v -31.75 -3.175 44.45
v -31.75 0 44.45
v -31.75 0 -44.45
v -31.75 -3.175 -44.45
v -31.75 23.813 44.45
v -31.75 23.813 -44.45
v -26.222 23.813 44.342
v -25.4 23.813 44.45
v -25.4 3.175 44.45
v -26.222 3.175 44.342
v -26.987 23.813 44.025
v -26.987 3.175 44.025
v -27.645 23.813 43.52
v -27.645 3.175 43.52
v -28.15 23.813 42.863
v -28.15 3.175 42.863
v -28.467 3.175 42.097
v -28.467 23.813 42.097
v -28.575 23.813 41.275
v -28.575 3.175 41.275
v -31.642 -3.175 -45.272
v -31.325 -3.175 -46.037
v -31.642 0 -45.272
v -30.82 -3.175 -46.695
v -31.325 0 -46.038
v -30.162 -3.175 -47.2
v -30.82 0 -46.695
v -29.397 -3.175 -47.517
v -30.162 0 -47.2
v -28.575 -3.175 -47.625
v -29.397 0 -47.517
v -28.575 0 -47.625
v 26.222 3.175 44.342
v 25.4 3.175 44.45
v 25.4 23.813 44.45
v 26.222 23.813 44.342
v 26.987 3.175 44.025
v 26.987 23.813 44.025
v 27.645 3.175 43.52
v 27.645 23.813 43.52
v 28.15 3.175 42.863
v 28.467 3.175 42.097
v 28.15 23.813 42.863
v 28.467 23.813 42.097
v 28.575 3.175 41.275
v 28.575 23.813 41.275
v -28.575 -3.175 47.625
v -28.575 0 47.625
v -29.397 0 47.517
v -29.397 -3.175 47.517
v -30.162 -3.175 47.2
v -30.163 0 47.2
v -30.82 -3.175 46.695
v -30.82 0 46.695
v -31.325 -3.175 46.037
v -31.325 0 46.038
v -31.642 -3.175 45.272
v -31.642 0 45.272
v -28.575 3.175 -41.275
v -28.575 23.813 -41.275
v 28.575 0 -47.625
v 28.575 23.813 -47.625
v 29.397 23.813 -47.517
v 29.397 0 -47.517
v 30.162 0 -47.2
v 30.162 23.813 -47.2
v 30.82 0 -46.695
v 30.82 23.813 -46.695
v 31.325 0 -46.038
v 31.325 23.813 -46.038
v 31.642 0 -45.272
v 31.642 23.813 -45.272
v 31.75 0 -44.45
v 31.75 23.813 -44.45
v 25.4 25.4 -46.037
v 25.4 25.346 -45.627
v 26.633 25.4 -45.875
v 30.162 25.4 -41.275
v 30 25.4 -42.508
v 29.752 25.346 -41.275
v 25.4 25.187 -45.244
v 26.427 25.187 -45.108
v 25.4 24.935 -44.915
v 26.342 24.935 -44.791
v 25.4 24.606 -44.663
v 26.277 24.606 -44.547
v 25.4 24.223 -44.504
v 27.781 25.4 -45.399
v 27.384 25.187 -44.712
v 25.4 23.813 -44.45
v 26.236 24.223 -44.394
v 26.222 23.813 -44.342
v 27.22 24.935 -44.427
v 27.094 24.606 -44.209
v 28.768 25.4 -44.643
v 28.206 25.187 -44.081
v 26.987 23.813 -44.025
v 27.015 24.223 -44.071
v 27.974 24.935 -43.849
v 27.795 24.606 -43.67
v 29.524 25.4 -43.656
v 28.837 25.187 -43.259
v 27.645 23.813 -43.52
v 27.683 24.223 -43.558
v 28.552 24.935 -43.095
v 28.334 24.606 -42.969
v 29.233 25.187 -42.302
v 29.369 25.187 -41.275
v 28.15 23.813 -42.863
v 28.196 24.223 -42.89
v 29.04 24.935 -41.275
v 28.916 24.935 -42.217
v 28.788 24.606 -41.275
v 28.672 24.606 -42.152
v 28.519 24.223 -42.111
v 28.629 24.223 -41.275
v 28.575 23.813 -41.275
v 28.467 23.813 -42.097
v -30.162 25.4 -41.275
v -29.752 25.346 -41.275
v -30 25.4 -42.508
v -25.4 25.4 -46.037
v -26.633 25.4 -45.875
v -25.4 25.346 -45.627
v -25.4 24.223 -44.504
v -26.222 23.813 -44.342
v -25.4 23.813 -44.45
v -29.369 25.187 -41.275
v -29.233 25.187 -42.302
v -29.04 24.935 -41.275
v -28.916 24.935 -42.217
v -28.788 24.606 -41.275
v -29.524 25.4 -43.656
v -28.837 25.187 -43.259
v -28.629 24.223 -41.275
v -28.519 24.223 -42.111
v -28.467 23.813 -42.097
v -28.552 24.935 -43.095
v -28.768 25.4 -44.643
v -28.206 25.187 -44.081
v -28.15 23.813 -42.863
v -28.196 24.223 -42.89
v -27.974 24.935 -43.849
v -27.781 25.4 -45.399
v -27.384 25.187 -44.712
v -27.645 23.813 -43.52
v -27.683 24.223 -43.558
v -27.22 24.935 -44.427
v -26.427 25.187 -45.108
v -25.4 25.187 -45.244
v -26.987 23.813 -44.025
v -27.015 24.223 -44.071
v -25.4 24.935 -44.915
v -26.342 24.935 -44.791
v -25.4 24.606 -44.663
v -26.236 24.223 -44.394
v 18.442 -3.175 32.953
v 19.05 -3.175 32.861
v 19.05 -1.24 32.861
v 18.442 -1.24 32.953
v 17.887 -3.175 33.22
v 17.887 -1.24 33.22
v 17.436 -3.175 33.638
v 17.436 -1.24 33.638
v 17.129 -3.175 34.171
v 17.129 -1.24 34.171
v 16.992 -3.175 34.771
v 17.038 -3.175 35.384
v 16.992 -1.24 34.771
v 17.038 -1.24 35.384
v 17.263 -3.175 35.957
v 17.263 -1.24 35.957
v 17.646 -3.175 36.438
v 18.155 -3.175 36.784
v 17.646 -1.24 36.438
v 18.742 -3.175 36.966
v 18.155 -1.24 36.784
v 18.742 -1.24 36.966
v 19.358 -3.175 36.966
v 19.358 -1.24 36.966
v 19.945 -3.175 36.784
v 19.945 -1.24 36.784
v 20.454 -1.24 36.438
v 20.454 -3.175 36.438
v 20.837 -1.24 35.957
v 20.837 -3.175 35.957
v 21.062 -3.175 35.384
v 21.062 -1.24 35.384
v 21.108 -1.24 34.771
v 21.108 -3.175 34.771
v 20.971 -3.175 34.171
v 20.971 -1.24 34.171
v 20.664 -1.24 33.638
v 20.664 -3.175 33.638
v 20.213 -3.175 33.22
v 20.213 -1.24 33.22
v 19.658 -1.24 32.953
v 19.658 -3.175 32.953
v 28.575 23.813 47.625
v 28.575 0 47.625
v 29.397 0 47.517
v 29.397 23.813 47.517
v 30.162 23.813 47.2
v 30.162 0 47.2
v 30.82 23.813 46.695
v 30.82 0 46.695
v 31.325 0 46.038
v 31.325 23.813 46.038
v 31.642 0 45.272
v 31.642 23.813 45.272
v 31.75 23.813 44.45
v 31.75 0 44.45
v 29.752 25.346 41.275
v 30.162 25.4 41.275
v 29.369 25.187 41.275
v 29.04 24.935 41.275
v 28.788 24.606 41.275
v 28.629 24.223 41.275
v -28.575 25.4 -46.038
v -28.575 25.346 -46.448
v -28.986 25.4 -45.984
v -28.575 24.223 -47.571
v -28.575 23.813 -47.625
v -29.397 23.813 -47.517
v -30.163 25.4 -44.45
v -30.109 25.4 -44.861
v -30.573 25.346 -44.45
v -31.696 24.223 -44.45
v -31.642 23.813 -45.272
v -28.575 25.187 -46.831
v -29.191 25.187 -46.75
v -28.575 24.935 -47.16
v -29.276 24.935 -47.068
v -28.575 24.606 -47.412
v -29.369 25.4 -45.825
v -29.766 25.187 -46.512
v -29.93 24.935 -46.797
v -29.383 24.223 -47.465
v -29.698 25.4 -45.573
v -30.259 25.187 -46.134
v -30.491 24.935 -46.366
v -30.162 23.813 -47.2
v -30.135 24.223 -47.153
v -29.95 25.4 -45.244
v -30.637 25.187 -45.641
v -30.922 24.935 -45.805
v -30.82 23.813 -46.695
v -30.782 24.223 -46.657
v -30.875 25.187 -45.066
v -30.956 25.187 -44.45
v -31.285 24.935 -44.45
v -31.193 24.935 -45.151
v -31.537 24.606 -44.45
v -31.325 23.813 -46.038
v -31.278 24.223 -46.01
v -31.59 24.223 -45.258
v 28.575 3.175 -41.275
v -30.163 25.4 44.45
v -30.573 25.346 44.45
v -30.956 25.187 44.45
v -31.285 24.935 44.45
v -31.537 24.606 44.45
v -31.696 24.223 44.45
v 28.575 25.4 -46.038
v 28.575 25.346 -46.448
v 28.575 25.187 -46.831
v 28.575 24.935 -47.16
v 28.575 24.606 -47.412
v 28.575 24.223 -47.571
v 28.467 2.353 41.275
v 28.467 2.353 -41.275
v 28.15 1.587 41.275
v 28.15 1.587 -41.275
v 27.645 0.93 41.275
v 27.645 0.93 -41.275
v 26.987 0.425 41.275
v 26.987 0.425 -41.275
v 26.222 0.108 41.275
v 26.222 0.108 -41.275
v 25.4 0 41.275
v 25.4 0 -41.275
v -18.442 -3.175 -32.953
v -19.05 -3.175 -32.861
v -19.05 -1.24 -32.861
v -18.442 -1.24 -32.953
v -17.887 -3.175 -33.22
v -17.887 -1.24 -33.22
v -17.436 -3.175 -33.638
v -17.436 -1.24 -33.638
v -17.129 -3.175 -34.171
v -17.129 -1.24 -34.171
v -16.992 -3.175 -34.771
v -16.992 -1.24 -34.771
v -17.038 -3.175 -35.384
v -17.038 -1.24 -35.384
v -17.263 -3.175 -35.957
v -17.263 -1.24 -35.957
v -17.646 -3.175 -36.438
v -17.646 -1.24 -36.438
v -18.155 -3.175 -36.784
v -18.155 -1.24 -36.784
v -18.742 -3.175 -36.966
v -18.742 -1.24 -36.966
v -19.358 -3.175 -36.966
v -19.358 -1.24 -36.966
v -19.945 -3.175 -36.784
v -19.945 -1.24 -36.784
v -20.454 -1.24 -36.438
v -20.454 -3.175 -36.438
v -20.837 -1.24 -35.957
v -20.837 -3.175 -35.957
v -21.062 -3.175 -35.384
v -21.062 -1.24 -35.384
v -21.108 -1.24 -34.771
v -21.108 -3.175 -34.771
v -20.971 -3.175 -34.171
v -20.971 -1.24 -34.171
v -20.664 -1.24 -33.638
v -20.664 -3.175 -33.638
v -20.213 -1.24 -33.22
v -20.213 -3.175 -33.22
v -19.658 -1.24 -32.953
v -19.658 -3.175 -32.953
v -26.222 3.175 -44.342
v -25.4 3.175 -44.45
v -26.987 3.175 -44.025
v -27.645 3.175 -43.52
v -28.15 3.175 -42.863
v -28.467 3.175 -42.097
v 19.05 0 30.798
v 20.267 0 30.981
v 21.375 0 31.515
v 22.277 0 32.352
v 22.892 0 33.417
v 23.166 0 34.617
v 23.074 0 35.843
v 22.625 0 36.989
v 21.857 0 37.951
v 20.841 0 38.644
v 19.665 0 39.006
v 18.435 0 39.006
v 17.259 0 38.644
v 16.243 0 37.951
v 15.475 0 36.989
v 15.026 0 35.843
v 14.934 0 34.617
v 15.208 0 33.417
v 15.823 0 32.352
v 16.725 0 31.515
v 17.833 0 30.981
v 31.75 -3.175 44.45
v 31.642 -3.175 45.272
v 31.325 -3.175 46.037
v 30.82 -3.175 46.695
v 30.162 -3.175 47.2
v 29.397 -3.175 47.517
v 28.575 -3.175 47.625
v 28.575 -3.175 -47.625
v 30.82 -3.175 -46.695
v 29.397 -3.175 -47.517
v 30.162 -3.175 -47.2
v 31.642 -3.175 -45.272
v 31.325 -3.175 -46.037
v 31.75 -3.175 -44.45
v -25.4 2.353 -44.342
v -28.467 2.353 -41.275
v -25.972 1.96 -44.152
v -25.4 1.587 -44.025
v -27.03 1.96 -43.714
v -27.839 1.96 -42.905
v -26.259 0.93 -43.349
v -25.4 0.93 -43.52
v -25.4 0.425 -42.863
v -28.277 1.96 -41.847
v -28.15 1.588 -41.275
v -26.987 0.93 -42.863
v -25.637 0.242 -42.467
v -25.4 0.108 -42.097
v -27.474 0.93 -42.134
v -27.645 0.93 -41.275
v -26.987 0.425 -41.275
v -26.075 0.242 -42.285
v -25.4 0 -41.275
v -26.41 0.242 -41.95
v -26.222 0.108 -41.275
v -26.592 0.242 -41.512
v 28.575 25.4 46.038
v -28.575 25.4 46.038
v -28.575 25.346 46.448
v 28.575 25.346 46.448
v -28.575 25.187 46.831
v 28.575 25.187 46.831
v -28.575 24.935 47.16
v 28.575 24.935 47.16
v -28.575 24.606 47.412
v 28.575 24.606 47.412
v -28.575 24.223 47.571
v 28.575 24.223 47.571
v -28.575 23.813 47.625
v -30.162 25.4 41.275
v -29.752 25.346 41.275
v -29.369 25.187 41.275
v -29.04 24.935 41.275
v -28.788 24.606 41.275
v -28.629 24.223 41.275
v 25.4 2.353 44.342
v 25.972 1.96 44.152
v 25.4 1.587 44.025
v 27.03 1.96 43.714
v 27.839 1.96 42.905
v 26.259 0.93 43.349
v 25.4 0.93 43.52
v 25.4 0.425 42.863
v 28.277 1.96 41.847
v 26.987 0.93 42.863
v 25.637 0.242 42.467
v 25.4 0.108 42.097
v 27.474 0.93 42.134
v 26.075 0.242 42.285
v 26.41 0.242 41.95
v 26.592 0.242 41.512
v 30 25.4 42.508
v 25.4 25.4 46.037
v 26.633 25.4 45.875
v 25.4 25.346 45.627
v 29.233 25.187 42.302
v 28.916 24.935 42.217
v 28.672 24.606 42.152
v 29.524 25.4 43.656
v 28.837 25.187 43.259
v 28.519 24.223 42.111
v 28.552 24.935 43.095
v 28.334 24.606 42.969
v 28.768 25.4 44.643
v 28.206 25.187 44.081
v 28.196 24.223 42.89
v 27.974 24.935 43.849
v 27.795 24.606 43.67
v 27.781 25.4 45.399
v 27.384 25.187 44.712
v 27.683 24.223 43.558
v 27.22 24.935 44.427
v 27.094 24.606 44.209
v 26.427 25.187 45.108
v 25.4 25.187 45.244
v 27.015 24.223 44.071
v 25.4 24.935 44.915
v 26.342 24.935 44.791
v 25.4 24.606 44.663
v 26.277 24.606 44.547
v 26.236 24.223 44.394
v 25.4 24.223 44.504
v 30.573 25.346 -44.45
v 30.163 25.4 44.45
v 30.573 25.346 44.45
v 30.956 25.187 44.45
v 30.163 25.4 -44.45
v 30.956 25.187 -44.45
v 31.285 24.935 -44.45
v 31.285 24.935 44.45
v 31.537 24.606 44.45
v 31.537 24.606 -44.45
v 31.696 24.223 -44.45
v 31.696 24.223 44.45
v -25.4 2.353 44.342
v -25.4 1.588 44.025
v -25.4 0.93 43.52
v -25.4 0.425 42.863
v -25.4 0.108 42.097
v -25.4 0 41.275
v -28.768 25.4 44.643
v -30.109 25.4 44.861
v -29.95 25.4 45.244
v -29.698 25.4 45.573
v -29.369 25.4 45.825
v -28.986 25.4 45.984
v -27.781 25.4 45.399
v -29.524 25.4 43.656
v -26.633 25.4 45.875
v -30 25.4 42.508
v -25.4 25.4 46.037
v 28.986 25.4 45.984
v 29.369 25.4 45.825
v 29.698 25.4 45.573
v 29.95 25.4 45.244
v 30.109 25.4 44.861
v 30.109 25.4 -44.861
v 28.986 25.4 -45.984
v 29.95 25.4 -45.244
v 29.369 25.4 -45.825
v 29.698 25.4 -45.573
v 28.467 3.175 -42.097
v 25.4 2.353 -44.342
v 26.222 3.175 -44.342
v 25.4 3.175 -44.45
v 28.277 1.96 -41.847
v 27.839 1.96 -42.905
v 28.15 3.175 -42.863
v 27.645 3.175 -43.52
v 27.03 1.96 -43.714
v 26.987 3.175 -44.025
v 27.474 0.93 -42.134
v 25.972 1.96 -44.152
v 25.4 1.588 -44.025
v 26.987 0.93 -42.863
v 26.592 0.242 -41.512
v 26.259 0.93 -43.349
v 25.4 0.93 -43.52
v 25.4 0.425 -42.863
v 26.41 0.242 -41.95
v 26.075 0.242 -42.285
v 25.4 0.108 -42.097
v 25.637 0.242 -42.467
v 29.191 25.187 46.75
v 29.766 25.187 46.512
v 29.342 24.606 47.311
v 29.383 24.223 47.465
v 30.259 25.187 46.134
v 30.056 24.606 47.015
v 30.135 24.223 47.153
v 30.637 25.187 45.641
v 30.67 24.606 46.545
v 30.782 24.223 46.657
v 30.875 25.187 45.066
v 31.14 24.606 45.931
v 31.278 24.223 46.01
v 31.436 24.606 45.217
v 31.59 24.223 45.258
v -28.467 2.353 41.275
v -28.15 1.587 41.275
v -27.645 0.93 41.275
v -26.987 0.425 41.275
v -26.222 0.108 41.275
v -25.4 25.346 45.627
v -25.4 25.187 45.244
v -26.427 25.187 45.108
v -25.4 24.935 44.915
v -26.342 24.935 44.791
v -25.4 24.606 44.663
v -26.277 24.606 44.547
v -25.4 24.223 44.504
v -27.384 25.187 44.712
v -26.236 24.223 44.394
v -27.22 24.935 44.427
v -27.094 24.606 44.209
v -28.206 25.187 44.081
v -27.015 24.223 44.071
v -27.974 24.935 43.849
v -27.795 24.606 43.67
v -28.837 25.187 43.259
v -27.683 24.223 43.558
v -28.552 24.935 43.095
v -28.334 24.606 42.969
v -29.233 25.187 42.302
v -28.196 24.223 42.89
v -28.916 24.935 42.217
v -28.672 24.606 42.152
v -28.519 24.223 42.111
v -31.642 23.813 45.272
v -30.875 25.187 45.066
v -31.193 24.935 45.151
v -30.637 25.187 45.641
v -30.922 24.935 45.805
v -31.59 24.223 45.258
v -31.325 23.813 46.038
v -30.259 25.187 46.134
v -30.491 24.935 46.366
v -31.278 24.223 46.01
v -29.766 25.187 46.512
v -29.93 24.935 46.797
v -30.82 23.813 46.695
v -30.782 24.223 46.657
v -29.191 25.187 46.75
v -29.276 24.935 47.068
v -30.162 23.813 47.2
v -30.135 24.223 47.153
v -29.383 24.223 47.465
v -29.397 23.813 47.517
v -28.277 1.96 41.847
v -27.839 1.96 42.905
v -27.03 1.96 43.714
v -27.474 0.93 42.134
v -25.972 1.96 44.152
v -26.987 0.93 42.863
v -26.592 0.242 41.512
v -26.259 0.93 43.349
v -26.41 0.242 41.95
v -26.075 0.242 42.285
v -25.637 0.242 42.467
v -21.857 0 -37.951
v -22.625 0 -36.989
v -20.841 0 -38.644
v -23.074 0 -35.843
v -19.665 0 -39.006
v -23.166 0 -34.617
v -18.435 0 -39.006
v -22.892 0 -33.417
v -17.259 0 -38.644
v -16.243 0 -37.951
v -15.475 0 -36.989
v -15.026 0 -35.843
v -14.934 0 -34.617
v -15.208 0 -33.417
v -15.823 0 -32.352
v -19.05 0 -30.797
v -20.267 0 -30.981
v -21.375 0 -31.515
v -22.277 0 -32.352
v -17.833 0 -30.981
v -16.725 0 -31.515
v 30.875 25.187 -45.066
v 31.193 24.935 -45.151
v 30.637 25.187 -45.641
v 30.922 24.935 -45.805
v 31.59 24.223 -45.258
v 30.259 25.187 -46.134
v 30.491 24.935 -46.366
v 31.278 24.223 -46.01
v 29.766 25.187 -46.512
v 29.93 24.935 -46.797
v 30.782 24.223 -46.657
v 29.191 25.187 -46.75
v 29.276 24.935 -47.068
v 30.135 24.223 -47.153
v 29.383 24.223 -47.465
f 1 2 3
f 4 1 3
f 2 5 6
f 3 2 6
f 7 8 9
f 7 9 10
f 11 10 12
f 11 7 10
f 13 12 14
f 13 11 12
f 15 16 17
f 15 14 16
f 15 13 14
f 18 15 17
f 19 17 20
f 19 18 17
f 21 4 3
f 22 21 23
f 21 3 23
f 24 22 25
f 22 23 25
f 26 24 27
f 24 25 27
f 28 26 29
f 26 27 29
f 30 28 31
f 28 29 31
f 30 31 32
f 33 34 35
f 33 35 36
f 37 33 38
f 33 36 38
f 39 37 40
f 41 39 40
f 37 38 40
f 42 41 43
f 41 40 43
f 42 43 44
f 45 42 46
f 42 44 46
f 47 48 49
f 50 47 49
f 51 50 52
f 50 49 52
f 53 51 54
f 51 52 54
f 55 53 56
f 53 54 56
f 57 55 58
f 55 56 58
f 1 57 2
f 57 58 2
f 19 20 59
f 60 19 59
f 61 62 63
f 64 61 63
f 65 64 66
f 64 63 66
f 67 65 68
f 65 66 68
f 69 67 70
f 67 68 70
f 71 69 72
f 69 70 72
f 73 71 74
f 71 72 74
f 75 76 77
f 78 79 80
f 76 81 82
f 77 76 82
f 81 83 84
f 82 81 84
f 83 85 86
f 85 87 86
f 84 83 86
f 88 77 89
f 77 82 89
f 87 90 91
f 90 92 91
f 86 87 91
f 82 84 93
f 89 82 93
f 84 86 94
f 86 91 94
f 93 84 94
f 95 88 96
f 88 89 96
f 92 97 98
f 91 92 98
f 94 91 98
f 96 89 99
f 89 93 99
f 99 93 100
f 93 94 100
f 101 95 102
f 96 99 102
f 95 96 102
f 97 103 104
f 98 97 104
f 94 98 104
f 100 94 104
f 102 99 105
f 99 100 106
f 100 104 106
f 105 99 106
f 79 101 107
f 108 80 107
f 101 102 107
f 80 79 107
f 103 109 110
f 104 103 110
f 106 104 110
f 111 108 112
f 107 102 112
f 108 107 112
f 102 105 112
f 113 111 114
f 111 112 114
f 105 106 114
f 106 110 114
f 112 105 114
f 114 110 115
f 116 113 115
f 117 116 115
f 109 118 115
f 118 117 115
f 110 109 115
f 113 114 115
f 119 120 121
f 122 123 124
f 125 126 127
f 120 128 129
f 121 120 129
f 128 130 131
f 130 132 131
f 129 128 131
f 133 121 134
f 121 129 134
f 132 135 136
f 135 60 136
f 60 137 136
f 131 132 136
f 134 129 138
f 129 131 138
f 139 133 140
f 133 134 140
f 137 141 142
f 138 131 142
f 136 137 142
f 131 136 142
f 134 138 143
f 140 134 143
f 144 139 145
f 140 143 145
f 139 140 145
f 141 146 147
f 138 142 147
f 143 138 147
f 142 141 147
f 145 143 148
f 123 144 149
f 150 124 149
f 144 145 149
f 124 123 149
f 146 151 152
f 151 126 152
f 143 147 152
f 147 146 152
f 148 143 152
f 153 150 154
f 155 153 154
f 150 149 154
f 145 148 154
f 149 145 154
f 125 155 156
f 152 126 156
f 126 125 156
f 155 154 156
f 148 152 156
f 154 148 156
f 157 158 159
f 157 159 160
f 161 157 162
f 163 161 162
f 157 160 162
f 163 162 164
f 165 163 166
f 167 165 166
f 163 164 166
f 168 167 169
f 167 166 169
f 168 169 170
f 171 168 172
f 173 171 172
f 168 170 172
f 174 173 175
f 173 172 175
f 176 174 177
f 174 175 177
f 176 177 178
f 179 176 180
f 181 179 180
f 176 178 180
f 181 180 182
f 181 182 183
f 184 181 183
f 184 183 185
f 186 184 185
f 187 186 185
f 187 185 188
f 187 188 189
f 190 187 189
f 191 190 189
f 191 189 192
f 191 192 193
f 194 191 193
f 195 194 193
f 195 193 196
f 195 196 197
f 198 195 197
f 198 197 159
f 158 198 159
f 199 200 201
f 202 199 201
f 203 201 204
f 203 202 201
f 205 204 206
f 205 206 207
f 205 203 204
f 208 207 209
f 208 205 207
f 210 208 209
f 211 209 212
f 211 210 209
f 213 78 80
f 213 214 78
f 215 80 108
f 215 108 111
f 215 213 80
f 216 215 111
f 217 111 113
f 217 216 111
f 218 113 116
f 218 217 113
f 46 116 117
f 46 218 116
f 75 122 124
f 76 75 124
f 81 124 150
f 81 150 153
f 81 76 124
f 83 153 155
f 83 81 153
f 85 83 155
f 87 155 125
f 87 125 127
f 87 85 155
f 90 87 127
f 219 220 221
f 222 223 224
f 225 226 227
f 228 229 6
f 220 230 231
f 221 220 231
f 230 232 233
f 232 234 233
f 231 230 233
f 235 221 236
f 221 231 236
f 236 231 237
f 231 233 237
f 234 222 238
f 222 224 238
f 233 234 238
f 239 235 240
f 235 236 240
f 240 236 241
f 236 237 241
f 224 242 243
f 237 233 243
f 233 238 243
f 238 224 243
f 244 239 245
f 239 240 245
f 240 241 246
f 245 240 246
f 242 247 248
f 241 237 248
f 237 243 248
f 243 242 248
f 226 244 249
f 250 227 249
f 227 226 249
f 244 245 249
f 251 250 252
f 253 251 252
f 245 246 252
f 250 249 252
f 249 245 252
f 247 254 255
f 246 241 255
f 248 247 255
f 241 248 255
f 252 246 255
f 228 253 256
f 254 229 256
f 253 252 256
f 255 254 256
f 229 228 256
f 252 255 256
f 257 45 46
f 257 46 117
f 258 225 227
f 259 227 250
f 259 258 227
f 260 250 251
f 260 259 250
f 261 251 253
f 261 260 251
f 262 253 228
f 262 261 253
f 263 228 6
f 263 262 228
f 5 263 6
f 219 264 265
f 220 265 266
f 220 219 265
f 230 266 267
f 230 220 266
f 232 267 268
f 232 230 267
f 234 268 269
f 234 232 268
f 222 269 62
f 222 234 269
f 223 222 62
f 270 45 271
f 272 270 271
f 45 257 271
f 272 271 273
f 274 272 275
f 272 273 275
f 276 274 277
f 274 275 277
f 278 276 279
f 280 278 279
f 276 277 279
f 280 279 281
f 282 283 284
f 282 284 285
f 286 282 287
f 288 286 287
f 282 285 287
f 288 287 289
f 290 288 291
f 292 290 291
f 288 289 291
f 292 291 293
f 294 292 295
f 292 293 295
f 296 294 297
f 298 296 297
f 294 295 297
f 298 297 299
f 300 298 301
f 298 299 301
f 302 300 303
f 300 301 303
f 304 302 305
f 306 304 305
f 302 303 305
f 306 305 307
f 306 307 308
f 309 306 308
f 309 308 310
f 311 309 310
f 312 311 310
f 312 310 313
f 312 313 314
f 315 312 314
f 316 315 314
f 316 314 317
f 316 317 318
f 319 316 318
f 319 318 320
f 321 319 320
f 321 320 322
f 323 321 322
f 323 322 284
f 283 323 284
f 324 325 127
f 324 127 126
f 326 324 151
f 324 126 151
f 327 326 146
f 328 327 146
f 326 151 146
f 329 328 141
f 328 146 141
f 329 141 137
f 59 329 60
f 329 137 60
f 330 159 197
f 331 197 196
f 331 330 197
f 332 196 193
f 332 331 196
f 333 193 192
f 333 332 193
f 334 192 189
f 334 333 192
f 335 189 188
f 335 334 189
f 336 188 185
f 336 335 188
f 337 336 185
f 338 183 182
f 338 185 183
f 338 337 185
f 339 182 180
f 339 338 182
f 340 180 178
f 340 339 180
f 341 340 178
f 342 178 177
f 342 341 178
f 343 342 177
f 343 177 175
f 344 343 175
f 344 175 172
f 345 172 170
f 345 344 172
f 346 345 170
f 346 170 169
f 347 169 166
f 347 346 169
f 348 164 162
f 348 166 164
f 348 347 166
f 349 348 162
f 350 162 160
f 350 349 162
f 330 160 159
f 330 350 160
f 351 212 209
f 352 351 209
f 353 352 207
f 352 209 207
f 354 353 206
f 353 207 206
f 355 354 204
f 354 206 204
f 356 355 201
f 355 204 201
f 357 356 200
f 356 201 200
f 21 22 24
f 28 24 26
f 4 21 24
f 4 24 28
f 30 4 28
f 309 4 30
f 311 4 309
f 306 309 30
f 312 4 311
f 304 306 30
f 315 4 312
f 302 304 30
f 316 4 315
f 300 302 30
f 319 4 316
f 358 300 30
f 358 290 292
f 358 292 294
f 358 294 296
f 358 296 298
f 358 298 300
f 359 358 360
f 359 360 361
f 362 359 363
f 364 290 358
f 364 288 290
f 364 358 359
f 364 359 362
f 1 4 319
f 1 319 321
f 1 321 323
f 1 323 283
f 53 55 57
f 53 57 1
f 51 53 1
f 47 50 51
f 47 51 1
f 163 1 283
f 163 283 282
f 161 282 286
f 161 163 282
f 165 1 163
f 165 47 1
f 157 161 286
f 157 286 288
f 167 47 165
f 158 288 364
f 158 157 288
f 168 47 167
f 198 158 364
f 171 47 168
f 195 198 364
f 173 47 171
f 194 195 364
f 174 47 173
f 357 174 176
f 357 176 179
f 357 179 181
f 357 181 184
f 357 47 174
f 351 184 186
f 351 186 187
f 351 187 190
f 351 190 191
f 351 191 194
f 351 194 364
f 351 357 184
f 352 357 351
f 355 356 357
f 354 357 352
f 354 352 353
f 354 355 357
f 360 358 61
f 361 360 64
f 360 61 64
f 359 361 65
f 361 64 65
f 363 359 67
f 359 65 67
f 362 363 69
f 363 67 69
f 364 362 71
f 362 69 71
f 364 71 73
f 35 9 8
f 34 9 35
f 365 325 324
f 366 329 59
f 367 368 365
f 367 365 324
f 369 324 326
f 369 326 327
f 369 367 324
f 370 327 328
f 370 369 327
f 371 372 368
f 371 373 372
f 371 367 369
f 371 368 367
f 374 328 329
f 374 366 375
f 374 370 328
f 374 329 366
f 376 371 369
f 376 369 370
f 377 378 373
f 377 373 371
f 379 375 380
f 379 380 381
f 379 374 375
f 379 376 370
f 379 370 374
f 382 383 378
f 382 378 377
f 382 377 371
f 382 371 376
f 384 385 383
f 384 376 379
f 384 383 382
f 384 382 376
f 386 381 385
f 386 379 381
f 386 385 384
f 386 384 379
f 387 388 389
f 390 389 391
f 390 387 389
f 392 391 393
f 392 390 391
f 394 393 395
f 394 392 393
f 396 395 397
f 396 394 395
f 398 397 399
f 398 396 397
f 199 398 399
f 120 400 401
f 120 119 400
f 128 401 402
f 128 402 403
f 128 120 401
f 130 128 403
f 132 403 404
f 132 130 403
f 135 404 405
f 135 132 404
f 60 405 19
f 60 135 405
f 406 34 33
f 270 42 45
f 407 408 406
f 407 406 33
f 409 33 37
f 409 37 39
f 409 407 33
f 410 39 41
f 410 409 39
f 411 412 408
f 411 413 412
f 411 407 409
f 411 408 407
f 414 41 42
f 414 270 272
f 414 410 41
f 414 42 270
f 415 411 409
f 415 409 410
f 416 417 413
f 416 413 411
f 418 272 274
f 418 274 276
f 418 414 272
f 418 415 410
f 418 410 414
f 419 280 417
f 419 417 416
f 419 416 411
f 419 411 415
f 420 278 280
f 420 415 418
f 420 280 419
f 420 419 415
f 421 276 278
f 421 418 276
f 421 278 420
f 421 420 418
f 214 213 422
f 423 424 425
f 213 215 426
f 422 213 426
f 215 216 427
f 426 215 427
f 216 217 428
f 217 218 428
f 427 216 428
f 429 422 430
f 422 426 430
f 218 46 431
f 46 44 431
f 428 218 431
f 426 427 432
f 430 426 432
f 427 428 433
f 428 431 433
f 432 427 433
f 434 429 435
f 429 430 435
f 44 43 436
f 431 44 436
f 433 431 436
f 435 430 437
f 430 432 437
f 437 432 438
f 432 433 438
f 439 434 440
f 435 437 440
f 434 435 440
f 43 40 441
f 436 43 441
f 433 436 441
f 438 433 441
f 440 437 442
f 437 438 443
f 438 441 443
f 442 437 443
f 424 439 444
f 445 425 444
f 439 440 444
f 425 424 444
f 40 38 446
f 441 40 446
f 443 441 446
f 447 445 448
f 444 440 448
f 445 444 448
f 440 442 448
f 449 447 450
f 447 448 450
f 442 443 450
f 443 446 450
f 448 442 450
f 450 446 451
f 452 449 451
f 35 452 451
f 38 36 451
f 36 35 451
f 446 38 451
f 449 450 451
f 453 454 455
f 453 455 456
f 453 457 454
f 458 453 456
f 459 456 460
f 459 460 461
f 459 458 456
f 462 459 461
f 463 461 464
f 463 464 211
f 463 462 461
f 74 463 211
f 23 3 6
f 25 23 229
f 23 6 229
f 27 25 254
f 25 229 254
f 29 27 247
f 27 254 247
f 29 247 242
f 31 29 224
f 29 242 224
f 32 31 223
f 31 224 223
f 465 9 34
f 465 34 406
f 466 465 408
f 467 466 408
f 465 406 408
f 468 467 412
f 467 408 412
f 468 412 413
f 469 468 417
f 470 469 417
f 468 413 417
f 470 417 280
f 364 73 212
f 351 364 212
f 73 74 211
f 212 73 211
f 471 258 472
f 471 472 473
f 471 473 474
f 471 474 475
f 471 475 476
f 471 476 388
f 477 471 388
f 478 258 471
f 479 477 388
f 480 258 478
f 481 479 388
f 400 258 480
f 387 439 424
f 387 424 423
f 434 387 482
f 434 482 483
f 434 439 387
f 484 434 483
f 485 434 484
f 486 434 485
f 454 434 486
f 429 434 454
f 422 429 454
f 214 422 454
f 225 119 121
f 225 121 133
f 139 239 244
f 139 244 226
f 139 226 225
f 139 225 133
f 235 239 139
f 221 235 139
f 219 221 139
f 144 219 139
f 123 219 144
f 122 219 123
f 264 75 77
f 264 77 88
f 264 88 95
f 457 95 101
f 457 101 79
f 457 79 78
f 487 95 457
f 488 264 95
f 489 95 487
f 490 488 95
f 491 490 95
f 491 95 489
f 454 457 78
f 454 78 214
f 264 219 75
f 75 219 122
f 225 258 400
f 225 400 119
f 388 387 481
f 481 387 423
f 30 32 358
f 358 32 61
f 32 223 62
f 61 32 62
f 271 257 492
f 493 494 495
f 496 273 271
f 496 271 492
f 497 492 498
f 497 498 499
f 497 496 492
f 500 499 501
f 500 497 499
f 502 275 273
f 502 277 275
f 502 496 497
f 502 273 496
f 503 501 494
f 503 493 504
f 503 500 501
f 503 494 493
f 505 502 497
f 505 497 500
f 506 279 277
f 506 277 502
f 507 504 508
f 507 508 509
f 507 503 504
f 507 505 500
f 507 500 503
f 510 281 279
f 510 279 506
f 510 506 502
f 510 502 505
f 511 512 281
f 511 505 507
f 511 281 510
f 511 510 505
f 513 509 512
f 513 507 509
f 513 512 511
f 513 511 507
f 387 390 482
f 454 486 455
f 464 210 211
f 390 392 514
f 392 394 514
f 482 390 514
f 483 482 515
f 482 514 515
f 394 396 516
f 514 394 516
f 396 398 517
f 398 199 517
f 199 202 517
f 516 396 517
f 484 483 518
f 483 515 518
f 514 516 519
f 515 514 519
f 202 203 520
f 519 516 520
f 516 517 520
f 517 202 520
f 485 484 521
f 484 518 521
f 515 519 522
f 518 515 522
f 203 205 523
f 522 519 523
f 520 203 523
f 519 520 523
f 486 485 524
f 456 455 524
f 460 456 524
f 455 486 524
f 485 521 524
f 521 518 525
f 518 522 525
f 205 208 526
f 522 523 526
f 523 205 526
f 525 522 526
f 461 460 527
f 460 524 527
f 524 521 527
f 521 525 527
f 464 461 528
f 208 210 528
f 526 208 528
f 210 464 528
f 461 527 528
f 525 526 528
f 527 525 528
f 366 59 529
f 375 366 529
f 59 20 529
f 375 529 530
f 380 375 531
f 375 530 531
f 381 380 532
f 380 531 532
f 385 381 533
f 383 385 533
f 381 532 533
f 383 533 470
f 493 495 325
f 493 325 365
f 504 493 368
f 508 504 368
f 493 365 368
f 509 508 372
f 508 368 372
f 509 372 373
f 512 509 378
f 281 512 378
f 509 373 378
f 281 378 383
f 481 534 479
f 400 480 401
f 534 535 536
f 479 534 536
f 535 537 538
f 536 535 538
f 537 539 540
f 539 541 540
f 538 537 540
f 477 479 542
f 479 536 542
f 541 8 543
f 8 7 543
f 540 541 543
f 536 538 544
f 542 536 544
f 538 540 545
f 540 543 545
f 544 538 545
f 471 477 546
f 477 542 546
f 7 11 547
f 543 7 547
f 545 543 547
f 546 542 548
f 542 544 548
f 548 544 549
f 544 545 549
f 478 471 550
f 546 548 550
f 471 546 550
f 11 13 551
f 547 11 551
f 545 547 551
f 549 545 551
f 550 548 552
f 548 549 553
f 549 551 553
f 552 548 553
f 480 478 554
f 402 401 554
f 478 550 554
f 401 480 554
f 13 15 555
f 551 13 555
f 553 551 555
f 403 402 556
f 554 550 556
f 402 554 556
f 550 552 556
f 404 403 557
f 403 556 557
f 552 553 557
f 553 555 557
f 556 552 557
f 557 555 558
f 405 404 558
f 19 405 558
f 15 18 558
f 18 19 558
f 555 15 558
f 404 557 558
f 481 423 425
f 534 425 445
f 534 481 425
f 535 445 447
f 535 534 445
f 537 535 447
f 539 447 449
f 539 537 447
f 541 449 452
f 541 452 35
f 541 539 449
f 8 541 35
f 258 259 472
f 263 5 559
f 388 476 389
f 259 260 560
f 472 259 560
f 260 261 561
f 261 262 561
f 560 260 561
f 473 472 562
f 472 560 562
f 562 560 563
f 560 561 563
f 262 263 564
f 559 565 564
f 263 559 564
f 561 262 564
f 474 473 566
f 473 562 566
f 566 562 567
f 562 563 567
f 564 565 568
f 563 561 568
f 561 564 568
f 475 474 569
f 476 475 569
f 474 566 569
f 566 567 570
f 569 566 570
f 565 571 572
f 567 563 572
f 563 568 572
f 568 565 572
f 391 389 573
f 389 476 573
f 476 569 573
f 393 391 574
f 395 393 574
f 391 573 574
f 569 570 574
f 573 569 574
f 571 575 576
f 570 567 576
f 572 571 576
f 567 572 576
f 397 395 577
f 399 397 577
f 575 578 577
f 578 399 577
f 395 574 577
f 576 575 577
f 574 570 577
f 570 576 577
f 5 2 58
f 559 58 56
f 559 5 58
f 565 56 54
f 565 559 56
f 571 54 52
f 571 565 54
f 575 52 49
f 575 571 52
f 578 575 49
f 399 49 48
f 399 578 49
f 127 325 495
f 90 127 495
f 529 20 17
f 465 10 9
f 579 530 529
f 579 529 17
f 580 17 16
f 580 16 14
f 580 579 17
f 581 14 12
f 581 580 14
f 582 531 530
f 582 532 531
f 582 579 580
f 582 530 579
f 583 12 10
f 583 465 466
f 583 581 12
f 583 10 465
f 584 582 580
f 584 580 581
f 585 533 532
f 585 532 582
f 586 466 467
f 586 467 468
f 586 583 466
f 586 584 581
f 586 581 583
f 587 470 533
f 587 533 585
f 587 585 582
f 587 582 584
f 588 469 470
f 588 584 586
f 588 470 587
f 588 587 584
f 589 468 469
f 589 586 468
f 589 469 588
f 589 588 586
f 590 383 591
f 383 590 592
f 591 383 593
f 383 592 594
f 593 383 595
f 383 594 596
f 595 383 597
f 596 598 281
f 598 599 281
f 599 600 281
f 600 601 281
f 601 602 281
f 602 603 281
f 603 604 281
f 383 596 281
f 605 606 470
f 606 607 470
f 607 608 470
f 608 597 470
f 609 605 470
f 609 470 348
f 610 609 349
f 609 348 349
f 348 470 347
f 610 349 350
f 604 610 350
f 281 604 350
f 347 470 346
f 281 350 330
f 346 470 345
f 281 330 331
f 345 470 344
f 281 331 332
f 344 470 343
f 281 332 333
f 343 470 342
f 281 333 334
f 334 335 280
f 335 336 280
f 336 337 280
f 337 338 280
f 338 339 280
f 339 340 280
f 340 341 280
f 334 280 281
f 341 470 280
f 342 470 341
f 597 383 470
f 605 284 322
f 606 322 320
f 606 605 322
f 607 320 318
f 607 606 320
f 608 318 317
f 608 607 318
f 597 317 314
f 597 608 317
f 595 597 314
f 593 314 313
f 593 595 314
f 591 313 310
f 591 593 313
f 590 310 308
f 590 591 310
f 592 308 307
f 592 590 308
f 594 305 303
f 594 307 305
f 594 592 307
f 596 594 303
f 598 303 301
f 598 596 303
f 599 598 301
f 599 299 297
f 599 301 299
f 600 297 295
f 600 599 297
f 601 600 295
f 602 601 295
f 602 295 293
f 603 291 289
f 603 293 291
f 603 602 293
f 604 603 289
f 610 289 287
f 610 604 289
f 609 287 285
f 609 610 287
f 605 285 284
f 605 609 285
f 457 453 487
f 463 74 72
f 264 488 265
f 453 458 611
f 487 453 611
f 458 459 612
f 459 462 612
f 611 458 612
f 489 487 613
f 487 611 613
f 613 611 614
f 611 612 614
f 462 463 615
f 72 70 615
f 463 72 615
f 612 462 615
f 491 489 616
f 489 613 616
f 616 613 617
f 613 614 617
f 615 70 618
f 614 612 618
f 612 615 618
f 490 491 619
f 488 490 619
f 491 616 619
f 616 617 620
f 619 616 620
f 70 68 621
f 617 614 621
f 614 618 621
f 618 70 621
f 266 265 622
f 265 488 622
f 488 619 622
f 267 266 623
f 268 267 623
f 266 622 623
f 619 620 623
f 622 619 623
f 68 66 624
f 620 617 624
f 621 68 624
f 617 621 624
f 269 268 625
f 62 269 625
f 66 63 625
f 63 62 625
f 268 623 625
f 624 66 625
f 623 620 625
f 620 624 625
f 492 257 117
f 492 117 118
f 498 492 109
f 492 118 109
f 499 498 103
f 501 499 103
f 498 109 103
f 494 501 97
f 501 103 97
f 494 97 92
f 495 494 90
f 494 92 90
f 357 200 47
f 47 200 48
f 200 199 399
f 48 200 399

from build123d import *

# Parameters (mm, degrees)
SKETCH1_W           = 63.5
SKETCH1_H           = 95.25
SKETCH1_W_2         = 57.15
SKETCH1_H_2         = 88.9
EXTRUDE_THIN1_DEPTH = 25.4
FILLET1_R           = 3.175
BOSS_EXTRUDE1_DEPTH = 3.175
FILLET2_R           = 3.175
SKETCH3_R           = 2.06375
CUT_EXTRUDE1_DEPTH  = 3.175
CIRPATTERN1_COUNT   = 2
FILLET3_R           = 1.5875


with BuildPart() as part:
    # Sketch1 → Extrude-Thin1 (new body)
    with BuildSketch(Plane(origin=(0, 0, 0), x_dir=(1, 0, 0), z_dir=(0, 1, 0))):
        Rectangle(SKETCH1_W, SKETCH1_H)
        Rectangle(SKETCH1_W_2, SKETCH1_H_2, mode=Mode.SUBTRACT)
    extrude(amount=EXTRUDE_THIN1_DEPTH)

    # Fillet1
    fillet1_edges = [part.edges().sort_by_distance(p)[0] for p in [
        (28.575, 12.7, 44.45),
        (28.575, 12.7, -44.45),
        (-28.575, 12.7, -44.45),
        (-28.575, 12.7, 44.45),
        (31.75, 12.7, 47.625),
        (-31.75, 12.7, 47.625),
        (-31.75, 12.7, -47.625),
        (31.75, 12.7, -47.625),
    ]]
    fillet(fillet1_edges, radius=FILLET1_R)

    # Sketch2 → Boss-Extrude1 (add)
    with BuildSketch(Plane.XZ):
        with BuildLine():
            Line((31.75, -44.45), (31.75, 44.45))
            ThreePointArc((31.75, 44.45), (30.82006403, 46.69506403), (28.575, 47.625))
            Line((28.575, 47.625), (-28.575, 47.625))
            ThreePointArc((-28.575, 47.625), (-30.82006403, 46.69506403), (-31.75, 44.45))
            Line((-31.75, 44.45), (-31.75, -44.45))
            ThreePointArc((-31.75, -44.45), (-30.82006403, -46.69506403), (-28.575, -47.625))
            Line((-28.575, -47.625), (28.575, -47.625))
            ThreePointArc((28.575, -47.625), (30.82006403, -46.69506403), (31.75, -44.45))
        make_face()
    extrude(amount=BOSS_EXTRUDE1_DEPTH)

    # Fillet2
    fillet2_edges = [part.edges().sort_by_distance(p)[0] for p in [
        (28.575, 0, 0),
        (0, 0, -44.45),
        (-28.575, 0, 0),
        (0, 0, 44.45),
        (-27.64506403, 0, 43.52006403),
        (27.64506403, 0, 43.52006403),
        (27.64506403, 0, -43.52006403),
        (-27.64506403, 0, -43.52006403),
    ]]
    fillet(fillet2_edges, radius=FILLET2_R)

    # Sketch3 → Cut-Extrude1 (cut)
    with BuildSketch(Plane(origin=(0, 0, 0), x_dir=(1, 0, 0), z_dir=(0, 1, 0))):
        with Locations(Location((-19.05, 34.925, 0), (0, 0, 270))):
            Circle(SKETCH3_R)
    cut_extrude1 = extrude(amount=-CUT_EXTRUDE1_DEPTH, mode=Mode.SUBTRACT)

    # Sketch4 → Cut-Revolve1 (revolve, cut)
    with BuildSketch(Plane.YX.offset(34.925), mode=Mode.PRIVATE) as cut_revolve1_sk:
        Polygon((-2.480052205, -19.05), (0, -14.9225), (0, -19.05), align=None)
    cut_revolve1 = revolve(cut_revolve1_sk.sketch.rotate(Axis((-19.05, 0, -34.925), (0, -1, 0)), 90), axis=Axis((-19.05, 0, -34.925), (0, -1, 0)), mode=Mode.SUBTRACT)

    # CirPattern1: Cut-Extrude1, Cut-Revolve1 ×2 about axis
    cirpattern1_axis = Axis((0, 0, 0), (0, 1, 0))
    add([cut_extrude1.rotate(cirpattern1_axis, i * 360 / CIRPATTERN1_COUNT) for i in range(1, CIRPATTERN1_COUNT)], mode=Mode.SUBTRACT)
    add([cut_revolve1.rotate(cirpattern1_axis, i * 360 / CIRPATTERN1_COUNT) for i in range(1, CIRPATTERN1_COUNT)], mode=Mode.SUBTRACT)

    # Fillet3
    fillet3_edges = [part.edges().sort_by_distance(p)[0] for p in [
        (31.75, 25.4, 0),
        (0, 25.4, 47.625),
        (0, 25.4, -47.625),
        (-31.75, 25.4, 0),
        (0, 25.4, -44.45),
        (28.575, 25.4, 0),
        (0, 25.4, 44.45),
        (-28.575, 25.4, 0),
        (-30.82006403, 25.4, 46.69506403),
        (30.82006403, 25.4, -46.69506403),
        (-30.82006403, 25.4, -46.69506403),
        (30.82006403, 25.4, 46.69506403),
        (-27.64506403, 25.4, 43.52006403),
        (27.64506403, 25.4, 43.52006403),
        (27.64506403, 25.4, -43.52006403),
        (-27.64506403, 25.4, -43.52006403),
    ]]
    fillet(fillet3_edges, radius=FILLET3_R - 0.0001)  # a hair under: the kernel refuses the full size


solid = part.part
